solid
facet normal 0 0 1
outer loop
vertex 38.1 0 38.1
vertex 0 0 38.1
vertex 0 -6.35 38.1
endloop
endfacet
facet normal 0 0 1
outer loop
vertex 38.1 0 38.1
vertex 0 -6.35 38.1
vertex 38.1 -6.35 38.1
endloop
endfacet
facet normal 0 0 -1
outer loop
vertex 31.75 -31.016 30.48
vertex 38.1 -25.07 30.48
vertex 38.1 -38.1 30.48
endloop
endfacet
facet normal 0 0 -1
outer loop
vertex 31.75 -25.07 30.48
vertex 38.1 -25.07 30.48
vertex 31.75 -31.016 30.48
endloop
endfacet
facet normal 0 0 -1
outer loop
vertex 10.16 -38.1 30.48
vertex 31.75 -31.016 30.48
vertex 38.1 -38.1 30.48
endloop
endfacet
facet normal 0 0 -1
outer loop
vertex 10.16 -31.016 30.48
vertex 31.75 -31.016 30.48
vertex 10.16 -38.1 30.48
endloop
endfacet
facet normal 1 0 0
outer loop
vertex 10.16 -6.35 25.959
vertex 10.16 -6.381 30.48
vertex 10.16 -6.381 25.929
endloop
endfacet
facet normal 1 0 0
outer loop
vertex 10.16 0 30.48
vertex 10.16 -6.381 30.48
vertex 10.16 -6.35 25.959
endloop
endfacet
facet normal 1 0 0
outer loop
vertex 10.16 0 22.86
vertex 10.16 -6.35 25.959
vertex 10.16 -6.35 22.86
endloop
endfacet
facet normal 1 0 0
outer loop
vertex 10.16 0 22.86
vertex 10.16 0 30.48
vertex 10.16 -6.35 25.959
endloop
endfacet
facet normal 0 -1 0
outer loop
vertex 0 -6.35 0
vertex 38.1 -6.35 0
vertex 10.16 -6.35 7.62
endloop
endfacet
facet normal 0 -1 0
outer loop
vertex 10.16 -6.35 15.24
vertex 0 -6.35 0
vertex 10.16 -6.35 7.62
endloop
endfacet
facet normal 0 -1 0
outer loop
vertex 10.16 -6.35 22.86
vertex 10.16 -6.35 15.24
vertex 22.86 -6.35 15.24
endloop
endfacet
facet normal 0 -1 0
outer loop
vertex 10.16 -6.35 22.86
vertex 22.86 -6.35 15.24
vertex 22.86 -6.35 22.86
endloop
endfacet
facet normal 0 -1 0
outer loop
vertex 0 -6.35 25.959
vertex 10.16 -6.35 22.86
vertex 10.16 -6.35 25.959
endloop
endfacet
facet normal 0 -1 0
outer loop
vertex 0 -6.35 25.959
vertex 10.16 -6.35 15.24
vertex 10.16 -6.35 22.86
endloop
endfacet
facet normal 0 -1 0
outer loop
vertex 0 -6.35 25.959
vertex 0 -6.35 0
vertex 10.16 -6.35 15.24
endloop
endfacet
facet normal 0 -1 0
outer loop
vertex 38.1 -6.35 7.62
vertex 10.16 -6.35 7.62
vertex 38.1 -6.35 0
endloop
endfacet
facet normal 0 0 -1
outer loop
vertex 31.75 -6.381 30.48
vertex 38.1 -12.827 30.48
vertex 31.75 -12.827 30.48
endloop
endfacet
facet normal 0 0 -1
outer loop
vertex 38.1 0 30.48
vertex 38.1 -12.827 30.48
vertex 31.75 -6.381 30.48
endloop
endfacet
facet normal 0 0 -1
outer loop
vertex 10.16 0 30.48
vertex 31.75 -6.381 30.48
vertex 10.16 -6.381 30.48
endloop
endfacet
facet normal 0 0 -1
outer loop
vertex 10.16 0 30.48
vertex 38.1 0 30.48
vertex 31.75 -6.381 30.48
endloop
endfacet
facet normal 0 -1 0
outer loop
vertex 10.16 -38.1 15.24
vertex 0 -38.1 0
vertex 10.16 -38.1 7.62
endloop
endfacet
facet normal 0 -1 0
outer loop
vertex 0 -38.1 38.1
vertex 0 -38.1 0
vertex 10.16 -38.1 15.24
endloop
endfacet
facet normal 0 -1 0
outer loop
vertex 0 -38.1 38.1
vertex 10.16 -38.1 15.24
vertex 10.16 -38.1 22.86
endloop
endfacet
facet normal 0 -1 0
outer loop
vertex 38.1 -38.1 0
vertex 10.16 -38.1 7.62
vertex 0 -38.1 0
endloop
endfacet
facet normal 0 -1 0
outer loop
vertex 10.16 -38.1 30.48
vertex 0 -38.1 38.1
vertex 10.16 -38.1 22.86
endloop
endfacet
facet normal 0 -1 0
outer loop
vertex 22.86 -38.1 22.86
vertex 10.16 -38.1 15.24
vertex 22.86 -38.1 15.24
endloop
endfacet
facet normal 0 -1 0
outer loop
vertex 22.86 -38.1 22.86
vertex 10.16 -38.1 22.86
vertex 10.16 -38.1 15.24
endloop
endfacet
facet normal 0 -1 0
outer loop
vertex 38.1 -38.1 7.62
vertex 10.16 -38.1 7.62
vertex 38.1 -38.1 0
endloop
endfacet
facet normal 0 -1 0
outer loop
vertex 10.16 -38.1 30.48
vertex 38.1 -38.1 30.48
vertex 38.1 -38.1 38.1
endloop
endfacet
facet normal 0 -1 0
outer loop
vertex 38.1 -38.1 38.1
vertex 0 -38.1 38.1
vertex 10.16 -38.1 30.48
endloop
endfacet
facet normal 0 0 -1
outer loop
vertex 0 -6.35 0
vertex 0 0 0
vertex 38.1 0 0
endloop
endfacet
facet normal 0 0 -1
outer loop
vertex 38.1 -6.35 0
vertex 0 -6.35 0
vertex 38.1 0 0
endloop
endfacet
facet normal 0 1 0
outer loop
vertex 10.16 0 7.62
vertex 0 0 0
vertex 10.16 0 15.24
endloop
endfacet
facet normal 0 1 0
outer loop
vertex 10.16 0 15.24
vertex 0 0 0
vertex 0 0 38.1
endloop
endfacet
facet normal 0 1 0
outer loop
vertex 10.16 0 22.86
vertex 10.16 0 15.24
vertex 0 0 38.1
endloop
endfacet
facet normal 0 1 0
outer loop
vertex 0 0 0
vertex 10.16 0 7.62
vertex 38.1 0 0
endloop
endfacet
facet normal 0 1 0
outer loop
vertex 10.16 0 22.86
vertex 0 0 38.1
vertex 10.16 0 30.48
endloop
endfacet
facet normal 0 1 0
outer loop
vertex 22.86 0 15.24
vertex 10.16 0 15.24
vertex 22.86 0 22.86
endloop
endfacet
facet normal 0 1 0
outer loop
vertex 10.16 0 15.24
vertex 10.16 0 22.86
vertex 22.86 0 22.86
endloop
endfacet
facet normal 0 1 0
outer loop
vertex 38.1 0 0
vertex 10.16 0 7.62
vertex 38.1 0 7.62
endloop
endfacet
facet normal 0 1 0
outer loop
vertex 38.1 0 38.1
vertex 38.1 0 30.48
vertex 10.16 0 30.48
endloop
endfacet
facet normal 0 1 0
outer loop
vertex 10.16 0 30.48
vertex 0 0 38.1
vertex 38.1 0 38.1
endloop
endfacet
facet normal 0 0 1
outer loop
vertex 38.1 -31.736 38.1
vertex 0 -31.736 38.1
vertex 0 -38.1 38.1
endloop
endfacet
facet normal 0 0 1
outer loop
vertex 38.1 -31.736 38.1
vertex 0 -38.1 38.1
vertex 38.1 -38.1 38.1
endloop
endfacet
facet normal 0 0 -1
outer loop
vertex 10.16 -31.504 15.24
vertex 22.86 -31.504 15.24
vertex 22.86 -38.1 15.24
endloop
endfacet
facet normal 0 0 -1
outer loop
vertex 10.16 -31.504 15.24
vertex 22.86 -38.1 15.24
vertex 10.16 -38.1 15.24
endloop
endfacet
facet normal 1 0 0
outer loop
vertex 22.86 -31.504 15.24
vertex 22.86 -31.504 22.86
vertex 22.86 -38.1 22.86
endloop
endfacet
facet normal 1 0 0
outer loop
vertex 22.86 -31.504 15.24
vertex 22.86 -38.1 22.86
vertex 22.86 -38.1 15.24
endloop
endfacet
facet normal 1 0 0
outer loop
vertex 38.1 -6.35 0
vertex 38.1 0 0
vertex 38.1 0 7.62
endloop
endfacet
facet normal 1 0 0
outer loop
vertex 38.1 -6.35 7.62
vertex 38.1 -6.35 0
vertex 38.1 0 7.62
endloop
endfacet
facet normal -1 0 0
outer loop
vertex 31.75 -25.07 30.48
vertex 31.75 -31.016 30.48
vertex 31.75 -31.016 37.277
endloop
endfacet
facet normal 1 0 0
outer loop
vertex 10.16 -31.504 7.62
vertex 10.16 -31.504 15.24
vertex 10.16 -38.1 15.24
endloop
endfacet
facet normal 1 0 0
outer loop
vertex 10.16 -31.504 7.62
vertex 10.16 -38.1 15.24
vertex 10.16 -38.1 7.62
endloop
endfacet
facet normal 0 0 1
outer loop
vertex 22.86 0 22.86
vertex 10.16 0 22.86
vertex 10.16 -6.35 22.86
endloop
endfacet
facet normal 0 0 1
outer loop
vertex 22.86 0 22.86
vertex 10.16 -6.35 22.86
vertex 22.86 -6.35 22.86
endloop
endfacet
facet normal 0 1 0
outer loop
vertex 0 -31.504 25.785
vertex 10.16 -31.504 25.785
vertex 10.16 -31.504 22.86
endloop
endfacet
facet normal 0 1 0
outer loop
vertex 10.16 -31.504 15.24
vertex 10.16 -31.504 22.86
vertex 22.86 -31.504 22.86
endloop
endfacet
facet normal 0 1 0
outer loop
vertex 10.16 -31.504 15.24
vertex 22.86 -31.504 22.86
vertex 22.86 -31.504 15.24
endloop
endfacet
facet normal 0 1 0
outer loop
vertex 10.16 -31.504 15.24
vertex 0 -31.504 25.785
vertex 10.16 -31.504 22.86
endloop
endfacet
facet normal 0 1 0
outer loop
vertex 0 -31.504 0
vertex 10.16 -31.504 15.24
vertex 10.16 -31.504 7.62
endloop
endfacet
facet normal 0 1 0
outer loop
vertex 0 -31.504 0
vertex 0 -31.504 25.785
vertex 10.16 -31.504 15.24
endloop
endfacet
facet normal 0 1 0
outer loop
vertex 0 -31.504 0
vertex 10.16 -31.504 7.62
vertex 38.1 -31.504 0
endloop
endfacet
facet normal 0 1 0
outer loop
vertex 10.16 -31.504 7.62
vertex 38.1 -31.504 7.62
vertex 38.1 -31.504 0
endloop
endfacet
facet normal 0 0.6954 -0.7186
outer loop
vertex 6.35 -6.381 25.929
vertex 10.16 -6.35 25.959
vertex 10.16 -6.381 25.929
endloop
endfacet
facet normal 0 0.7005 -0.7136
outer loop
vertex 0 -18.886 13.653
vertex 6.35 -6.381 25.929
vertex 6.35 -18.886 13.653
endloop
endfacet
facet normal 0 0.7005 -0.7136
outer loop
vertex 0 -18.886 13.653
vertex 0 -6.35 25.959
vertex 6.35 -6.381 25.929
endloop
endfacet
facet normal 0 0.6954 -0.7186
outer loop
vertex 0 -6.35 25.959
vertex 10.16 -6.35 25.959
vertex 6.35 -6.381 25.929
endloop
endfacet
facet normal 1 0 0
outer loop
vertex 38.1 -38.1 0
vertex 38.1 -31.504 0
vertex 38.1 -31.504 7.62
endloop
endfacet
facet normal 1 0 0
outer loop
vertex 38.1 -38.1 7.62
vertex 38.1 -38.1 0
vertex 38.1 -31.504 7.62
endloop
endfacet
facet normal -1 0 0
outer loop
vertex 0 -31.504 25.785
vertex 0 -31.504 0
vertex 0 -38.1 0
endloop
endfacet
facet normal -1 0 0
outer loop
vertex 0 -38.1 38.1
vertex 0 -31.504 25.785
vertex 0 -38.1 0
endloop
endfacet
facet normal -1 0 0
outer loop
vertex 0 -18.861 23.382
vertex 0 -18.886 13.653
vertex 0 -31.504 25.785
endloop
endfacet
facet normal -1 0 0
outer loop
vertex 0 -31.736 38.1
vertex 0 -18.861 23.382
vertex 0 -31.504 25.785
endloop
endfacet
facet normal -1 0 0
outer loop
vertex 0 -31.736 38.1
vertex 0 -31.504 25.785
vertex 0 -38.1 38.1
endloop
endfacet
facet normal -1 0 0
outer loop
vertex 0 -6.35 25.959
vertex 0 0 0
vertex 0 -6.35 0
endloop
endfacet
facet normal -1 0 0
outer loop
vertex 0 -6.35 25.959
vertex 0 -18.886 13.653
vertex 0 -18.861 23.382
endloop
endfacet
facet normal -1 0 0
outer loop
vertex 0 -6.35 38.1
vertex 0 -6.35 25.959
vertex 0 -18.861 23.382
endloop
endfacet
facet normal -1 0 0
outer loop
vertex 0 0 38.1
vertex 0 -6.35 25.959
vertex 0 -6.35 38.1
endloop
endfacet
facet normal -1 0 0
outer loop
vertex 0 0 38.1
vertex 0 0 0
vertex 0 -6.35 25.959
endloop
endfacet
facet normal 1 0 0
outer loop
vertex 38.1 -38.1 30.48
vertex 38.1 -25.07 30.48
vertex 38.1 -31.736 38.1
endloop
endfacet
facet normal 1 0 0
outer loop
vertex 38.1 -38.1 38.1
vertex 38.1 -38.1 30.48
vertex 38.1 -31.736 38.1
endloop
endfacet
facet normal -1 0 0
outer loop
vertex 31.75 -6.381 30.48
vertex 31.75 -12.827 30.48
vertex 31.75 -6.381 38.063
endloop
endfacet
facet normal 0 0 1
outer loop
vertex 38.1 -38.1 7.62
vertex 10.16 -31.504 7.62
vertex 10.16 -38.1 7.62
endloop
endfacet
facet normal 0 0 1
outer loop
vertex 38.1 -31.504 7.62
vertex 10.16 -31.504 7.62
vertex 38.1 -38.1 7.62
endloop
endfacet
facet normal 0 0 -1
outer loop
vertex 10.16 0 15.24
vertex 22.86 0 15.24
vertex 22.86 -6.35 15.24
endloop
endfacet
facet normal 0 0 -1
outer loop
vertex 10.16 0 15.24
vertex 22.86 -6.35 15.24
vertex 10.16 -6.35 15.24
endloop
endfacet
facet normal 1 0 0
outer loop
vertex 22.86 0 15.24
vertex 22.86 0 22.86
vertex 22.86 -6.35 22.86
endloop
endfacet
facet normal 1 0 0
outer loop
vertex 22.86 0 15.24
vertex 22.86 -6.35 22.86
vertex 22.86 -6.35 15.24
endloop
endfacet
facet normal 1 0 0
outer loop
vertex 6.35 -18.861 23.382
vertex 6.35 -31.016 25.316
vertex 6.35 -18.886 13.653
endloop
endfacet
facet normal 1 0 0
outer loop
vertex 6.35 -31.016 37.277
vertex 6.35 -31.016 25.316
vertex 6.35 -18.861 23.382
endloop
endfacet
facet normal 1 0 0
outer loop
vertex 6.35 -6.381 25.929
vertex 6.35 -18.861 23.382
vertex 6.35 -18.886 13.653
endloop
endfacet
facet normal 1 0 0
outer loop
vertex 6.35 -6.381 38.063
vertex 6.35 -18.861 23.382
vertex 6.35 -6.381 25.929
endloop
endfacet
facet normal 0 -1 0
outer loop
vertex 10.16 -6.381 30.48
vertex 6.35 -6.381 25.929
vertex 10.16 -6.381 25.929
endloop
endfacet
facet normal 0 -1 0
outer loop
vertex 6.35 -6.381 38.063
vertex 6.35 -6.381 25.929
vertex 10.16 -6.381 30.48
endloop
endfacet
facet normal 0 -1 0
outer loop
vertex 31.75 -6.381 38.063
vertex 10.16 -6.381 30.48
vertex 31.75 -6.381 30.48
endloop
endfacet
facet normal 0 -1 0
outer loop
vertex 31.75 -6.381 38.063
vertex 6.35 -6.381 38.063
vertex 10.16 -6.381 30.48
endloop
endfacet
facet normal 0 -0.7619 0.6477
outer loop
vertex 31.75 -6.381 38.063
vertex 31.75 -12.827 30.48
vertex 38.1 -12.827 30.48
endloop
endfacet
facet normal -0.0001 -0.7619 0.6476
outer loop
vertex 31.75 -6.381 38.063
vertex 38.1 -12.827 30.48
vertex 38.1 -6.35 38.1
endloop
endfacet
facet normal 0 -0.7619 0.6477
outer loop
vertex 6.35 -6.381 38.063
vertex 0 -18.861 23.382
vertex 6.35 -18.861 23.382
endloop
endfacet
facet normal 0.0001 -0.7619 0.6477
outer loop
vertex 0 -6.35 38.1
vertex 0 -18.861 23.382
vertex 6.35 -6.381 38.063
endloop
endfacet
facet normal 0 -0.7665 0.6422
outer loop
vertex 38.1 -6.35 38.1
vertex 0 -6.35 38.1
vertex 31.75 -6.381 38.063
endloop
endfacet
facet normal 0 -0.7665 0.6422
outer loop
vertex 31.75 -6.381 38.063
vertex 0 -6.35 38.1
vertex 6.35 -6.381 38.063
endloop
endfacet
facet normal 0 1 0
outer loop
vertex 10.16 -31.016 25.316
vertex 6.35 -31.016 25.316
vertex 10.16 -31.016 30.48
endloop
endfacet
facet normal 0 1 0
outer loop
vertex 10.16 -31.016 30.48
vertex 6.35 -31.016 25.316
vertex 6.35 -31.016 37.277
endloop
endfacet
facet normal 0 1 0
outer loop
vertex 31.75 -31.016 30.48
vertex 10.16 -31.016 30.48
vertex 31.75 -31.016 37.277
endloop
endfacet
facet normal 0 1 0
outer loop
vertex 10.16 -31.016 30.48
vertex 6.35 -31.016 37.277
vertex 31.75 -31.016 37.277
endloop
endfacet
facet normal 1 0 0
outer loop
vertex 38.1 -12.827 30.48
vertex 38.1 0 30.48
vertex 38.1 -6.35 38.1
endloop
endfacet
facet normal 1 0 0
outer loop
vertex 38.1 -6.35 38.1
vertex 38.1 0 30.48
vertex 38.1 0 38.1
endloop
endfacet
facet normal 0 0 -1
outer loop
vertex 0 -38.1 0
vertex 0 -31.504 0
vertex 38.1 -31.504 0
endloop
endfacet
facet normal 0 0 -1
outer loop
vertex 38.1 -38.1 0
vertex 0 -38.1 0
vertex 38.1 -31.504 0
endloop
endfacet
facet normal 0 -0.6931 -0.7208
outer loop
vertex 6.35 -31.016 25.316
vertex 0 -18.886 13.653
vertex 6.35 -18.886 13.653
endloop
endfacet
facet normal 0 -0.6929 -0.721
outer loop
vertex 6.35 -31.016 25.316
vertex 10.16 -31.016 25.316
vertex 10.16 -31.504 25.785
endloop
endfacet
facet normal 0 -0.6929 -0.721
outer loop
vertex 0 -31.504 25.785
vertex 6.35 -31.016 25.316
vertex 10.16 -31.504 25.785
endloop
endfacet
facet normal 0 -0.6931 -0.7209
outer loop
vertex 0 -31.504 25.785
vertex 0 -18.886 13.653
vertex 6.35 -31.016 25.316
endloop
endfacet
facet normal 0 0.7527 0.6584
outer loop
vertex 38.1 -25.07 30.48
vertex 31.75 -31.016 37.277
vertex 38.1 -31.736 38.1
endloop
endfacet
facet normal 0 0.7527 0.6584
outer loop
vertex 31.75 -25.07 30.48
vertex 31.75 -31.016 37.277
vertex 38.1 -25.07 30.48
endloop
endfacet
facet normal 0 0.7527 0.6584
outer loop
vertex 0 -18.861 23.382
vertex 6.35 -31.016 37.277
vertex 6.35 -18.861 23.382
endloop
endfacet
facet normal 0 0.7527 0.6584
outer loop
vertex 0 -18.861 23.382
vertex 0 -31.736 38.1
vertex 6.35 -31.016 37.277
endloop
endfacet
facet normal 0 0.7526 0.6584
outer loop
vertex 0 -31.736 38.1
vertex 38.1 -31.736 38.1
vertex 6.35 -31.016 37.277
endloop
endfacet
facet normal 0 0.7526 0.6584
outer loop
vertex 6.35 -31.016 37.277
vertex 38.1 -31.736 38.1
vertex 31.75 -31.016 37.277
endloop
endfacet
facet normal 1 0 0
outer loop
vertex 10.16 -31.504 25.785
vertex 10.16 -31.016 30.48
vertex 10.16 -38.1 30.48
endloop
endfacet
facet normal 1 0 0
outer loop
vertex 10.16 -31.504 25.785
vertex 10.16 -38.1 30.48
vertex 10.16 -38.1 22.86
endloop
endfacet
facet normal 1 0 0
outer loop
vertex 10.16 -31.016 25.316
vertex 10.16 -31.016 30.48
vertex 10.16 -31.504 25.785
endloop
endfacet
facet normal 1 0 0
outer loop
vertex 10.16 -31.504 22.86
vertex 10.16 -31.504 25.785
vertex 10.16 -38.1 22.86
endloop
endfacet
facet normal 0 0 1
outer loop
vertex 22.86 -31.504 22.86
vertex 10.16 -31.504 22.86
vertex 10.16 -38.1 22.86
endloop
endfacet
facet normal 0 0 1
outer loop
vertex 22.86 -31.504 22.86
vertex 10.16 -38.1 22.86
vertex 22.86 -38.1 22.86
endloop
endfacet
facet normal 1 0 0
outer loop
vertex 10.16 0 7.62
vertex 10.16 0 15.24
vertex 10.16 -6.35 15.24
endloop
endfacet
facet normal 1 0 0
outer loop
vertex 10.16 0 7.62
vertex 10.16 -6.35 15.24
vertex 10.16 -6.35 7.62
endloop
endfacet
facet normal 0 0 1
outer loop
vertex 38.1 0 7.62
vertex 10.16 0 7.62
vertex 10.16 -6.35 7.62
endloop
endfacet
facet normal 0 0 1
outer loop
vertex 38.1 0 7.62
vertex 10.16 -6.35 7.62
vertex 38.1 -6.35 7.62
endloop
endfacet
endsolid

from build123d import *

# Parameters (mm, degrees)
F0_W      = 38.1
F0_H      = 38.1
F2_DEPTH  = 38.1
F4_DEPTH  = 38.1
F6_W      = 25.4
F6_H      = 24.634876
F8_DEPTH  = 38.1
F10_DEPTH = 38.1
F12_DEPTH = 38.1


with BuildPart() as f2:
    # F0 (on Front) → F2 (new body)
    with BuildSketch(Plane.XZ):
        with Locations((19.05, 19.05)):
            Rectangle(F0_W, F0_H)
    extrude(amount=F2_DEPTH)

    # F3 (on Front) → F4 (cut)
    with BuildSketch(Plane.XZ):
        Polygon((38.1, 7.62), (38.1, 30.48), (10.16, 30.48), (10.16, 22.86), (22.86, 22.86), (22.86, 15.24), (10.16, 15.24), (10.16, 7.62), align=None)
    extrude(amount=F4_DEPTH, mode=Mode.SUBTRACT)

    # F6 (on offset) → F8 (cut)
    with BuildSketch(Plane.XY.offset(38.1)):
        with Locations((19.05, -18.698502)):
            Rectangle(F6_W, F6_H)
    extrude(amount=-F8_DEPTH, mode=Mode.SUBTRACT)

    # F9 (on Right) → F10 (cut)
    with BuildSketch(Plane.YZ):
        Polygon((-18.861001, 23.382206), (-6.35, 38.1), (-31.735882, 38.1), align=None)
    extrude(amount=F10_DEPTH, mode=Mode.SUBTRACT)

    # F11 (on Right) → F12 (cut)
    with BuildSketch(Plane.YZ):
        Polygon((-31.504388, 0), (-6.35, 0), (-6.35, 25.959453), (-18.885972, 13.653007), (-31.504388, 25.785374), align=None)
    extrude(amount=F12_DEPTH, mode=Mode.SUBTRACT)


solid = f2.part
